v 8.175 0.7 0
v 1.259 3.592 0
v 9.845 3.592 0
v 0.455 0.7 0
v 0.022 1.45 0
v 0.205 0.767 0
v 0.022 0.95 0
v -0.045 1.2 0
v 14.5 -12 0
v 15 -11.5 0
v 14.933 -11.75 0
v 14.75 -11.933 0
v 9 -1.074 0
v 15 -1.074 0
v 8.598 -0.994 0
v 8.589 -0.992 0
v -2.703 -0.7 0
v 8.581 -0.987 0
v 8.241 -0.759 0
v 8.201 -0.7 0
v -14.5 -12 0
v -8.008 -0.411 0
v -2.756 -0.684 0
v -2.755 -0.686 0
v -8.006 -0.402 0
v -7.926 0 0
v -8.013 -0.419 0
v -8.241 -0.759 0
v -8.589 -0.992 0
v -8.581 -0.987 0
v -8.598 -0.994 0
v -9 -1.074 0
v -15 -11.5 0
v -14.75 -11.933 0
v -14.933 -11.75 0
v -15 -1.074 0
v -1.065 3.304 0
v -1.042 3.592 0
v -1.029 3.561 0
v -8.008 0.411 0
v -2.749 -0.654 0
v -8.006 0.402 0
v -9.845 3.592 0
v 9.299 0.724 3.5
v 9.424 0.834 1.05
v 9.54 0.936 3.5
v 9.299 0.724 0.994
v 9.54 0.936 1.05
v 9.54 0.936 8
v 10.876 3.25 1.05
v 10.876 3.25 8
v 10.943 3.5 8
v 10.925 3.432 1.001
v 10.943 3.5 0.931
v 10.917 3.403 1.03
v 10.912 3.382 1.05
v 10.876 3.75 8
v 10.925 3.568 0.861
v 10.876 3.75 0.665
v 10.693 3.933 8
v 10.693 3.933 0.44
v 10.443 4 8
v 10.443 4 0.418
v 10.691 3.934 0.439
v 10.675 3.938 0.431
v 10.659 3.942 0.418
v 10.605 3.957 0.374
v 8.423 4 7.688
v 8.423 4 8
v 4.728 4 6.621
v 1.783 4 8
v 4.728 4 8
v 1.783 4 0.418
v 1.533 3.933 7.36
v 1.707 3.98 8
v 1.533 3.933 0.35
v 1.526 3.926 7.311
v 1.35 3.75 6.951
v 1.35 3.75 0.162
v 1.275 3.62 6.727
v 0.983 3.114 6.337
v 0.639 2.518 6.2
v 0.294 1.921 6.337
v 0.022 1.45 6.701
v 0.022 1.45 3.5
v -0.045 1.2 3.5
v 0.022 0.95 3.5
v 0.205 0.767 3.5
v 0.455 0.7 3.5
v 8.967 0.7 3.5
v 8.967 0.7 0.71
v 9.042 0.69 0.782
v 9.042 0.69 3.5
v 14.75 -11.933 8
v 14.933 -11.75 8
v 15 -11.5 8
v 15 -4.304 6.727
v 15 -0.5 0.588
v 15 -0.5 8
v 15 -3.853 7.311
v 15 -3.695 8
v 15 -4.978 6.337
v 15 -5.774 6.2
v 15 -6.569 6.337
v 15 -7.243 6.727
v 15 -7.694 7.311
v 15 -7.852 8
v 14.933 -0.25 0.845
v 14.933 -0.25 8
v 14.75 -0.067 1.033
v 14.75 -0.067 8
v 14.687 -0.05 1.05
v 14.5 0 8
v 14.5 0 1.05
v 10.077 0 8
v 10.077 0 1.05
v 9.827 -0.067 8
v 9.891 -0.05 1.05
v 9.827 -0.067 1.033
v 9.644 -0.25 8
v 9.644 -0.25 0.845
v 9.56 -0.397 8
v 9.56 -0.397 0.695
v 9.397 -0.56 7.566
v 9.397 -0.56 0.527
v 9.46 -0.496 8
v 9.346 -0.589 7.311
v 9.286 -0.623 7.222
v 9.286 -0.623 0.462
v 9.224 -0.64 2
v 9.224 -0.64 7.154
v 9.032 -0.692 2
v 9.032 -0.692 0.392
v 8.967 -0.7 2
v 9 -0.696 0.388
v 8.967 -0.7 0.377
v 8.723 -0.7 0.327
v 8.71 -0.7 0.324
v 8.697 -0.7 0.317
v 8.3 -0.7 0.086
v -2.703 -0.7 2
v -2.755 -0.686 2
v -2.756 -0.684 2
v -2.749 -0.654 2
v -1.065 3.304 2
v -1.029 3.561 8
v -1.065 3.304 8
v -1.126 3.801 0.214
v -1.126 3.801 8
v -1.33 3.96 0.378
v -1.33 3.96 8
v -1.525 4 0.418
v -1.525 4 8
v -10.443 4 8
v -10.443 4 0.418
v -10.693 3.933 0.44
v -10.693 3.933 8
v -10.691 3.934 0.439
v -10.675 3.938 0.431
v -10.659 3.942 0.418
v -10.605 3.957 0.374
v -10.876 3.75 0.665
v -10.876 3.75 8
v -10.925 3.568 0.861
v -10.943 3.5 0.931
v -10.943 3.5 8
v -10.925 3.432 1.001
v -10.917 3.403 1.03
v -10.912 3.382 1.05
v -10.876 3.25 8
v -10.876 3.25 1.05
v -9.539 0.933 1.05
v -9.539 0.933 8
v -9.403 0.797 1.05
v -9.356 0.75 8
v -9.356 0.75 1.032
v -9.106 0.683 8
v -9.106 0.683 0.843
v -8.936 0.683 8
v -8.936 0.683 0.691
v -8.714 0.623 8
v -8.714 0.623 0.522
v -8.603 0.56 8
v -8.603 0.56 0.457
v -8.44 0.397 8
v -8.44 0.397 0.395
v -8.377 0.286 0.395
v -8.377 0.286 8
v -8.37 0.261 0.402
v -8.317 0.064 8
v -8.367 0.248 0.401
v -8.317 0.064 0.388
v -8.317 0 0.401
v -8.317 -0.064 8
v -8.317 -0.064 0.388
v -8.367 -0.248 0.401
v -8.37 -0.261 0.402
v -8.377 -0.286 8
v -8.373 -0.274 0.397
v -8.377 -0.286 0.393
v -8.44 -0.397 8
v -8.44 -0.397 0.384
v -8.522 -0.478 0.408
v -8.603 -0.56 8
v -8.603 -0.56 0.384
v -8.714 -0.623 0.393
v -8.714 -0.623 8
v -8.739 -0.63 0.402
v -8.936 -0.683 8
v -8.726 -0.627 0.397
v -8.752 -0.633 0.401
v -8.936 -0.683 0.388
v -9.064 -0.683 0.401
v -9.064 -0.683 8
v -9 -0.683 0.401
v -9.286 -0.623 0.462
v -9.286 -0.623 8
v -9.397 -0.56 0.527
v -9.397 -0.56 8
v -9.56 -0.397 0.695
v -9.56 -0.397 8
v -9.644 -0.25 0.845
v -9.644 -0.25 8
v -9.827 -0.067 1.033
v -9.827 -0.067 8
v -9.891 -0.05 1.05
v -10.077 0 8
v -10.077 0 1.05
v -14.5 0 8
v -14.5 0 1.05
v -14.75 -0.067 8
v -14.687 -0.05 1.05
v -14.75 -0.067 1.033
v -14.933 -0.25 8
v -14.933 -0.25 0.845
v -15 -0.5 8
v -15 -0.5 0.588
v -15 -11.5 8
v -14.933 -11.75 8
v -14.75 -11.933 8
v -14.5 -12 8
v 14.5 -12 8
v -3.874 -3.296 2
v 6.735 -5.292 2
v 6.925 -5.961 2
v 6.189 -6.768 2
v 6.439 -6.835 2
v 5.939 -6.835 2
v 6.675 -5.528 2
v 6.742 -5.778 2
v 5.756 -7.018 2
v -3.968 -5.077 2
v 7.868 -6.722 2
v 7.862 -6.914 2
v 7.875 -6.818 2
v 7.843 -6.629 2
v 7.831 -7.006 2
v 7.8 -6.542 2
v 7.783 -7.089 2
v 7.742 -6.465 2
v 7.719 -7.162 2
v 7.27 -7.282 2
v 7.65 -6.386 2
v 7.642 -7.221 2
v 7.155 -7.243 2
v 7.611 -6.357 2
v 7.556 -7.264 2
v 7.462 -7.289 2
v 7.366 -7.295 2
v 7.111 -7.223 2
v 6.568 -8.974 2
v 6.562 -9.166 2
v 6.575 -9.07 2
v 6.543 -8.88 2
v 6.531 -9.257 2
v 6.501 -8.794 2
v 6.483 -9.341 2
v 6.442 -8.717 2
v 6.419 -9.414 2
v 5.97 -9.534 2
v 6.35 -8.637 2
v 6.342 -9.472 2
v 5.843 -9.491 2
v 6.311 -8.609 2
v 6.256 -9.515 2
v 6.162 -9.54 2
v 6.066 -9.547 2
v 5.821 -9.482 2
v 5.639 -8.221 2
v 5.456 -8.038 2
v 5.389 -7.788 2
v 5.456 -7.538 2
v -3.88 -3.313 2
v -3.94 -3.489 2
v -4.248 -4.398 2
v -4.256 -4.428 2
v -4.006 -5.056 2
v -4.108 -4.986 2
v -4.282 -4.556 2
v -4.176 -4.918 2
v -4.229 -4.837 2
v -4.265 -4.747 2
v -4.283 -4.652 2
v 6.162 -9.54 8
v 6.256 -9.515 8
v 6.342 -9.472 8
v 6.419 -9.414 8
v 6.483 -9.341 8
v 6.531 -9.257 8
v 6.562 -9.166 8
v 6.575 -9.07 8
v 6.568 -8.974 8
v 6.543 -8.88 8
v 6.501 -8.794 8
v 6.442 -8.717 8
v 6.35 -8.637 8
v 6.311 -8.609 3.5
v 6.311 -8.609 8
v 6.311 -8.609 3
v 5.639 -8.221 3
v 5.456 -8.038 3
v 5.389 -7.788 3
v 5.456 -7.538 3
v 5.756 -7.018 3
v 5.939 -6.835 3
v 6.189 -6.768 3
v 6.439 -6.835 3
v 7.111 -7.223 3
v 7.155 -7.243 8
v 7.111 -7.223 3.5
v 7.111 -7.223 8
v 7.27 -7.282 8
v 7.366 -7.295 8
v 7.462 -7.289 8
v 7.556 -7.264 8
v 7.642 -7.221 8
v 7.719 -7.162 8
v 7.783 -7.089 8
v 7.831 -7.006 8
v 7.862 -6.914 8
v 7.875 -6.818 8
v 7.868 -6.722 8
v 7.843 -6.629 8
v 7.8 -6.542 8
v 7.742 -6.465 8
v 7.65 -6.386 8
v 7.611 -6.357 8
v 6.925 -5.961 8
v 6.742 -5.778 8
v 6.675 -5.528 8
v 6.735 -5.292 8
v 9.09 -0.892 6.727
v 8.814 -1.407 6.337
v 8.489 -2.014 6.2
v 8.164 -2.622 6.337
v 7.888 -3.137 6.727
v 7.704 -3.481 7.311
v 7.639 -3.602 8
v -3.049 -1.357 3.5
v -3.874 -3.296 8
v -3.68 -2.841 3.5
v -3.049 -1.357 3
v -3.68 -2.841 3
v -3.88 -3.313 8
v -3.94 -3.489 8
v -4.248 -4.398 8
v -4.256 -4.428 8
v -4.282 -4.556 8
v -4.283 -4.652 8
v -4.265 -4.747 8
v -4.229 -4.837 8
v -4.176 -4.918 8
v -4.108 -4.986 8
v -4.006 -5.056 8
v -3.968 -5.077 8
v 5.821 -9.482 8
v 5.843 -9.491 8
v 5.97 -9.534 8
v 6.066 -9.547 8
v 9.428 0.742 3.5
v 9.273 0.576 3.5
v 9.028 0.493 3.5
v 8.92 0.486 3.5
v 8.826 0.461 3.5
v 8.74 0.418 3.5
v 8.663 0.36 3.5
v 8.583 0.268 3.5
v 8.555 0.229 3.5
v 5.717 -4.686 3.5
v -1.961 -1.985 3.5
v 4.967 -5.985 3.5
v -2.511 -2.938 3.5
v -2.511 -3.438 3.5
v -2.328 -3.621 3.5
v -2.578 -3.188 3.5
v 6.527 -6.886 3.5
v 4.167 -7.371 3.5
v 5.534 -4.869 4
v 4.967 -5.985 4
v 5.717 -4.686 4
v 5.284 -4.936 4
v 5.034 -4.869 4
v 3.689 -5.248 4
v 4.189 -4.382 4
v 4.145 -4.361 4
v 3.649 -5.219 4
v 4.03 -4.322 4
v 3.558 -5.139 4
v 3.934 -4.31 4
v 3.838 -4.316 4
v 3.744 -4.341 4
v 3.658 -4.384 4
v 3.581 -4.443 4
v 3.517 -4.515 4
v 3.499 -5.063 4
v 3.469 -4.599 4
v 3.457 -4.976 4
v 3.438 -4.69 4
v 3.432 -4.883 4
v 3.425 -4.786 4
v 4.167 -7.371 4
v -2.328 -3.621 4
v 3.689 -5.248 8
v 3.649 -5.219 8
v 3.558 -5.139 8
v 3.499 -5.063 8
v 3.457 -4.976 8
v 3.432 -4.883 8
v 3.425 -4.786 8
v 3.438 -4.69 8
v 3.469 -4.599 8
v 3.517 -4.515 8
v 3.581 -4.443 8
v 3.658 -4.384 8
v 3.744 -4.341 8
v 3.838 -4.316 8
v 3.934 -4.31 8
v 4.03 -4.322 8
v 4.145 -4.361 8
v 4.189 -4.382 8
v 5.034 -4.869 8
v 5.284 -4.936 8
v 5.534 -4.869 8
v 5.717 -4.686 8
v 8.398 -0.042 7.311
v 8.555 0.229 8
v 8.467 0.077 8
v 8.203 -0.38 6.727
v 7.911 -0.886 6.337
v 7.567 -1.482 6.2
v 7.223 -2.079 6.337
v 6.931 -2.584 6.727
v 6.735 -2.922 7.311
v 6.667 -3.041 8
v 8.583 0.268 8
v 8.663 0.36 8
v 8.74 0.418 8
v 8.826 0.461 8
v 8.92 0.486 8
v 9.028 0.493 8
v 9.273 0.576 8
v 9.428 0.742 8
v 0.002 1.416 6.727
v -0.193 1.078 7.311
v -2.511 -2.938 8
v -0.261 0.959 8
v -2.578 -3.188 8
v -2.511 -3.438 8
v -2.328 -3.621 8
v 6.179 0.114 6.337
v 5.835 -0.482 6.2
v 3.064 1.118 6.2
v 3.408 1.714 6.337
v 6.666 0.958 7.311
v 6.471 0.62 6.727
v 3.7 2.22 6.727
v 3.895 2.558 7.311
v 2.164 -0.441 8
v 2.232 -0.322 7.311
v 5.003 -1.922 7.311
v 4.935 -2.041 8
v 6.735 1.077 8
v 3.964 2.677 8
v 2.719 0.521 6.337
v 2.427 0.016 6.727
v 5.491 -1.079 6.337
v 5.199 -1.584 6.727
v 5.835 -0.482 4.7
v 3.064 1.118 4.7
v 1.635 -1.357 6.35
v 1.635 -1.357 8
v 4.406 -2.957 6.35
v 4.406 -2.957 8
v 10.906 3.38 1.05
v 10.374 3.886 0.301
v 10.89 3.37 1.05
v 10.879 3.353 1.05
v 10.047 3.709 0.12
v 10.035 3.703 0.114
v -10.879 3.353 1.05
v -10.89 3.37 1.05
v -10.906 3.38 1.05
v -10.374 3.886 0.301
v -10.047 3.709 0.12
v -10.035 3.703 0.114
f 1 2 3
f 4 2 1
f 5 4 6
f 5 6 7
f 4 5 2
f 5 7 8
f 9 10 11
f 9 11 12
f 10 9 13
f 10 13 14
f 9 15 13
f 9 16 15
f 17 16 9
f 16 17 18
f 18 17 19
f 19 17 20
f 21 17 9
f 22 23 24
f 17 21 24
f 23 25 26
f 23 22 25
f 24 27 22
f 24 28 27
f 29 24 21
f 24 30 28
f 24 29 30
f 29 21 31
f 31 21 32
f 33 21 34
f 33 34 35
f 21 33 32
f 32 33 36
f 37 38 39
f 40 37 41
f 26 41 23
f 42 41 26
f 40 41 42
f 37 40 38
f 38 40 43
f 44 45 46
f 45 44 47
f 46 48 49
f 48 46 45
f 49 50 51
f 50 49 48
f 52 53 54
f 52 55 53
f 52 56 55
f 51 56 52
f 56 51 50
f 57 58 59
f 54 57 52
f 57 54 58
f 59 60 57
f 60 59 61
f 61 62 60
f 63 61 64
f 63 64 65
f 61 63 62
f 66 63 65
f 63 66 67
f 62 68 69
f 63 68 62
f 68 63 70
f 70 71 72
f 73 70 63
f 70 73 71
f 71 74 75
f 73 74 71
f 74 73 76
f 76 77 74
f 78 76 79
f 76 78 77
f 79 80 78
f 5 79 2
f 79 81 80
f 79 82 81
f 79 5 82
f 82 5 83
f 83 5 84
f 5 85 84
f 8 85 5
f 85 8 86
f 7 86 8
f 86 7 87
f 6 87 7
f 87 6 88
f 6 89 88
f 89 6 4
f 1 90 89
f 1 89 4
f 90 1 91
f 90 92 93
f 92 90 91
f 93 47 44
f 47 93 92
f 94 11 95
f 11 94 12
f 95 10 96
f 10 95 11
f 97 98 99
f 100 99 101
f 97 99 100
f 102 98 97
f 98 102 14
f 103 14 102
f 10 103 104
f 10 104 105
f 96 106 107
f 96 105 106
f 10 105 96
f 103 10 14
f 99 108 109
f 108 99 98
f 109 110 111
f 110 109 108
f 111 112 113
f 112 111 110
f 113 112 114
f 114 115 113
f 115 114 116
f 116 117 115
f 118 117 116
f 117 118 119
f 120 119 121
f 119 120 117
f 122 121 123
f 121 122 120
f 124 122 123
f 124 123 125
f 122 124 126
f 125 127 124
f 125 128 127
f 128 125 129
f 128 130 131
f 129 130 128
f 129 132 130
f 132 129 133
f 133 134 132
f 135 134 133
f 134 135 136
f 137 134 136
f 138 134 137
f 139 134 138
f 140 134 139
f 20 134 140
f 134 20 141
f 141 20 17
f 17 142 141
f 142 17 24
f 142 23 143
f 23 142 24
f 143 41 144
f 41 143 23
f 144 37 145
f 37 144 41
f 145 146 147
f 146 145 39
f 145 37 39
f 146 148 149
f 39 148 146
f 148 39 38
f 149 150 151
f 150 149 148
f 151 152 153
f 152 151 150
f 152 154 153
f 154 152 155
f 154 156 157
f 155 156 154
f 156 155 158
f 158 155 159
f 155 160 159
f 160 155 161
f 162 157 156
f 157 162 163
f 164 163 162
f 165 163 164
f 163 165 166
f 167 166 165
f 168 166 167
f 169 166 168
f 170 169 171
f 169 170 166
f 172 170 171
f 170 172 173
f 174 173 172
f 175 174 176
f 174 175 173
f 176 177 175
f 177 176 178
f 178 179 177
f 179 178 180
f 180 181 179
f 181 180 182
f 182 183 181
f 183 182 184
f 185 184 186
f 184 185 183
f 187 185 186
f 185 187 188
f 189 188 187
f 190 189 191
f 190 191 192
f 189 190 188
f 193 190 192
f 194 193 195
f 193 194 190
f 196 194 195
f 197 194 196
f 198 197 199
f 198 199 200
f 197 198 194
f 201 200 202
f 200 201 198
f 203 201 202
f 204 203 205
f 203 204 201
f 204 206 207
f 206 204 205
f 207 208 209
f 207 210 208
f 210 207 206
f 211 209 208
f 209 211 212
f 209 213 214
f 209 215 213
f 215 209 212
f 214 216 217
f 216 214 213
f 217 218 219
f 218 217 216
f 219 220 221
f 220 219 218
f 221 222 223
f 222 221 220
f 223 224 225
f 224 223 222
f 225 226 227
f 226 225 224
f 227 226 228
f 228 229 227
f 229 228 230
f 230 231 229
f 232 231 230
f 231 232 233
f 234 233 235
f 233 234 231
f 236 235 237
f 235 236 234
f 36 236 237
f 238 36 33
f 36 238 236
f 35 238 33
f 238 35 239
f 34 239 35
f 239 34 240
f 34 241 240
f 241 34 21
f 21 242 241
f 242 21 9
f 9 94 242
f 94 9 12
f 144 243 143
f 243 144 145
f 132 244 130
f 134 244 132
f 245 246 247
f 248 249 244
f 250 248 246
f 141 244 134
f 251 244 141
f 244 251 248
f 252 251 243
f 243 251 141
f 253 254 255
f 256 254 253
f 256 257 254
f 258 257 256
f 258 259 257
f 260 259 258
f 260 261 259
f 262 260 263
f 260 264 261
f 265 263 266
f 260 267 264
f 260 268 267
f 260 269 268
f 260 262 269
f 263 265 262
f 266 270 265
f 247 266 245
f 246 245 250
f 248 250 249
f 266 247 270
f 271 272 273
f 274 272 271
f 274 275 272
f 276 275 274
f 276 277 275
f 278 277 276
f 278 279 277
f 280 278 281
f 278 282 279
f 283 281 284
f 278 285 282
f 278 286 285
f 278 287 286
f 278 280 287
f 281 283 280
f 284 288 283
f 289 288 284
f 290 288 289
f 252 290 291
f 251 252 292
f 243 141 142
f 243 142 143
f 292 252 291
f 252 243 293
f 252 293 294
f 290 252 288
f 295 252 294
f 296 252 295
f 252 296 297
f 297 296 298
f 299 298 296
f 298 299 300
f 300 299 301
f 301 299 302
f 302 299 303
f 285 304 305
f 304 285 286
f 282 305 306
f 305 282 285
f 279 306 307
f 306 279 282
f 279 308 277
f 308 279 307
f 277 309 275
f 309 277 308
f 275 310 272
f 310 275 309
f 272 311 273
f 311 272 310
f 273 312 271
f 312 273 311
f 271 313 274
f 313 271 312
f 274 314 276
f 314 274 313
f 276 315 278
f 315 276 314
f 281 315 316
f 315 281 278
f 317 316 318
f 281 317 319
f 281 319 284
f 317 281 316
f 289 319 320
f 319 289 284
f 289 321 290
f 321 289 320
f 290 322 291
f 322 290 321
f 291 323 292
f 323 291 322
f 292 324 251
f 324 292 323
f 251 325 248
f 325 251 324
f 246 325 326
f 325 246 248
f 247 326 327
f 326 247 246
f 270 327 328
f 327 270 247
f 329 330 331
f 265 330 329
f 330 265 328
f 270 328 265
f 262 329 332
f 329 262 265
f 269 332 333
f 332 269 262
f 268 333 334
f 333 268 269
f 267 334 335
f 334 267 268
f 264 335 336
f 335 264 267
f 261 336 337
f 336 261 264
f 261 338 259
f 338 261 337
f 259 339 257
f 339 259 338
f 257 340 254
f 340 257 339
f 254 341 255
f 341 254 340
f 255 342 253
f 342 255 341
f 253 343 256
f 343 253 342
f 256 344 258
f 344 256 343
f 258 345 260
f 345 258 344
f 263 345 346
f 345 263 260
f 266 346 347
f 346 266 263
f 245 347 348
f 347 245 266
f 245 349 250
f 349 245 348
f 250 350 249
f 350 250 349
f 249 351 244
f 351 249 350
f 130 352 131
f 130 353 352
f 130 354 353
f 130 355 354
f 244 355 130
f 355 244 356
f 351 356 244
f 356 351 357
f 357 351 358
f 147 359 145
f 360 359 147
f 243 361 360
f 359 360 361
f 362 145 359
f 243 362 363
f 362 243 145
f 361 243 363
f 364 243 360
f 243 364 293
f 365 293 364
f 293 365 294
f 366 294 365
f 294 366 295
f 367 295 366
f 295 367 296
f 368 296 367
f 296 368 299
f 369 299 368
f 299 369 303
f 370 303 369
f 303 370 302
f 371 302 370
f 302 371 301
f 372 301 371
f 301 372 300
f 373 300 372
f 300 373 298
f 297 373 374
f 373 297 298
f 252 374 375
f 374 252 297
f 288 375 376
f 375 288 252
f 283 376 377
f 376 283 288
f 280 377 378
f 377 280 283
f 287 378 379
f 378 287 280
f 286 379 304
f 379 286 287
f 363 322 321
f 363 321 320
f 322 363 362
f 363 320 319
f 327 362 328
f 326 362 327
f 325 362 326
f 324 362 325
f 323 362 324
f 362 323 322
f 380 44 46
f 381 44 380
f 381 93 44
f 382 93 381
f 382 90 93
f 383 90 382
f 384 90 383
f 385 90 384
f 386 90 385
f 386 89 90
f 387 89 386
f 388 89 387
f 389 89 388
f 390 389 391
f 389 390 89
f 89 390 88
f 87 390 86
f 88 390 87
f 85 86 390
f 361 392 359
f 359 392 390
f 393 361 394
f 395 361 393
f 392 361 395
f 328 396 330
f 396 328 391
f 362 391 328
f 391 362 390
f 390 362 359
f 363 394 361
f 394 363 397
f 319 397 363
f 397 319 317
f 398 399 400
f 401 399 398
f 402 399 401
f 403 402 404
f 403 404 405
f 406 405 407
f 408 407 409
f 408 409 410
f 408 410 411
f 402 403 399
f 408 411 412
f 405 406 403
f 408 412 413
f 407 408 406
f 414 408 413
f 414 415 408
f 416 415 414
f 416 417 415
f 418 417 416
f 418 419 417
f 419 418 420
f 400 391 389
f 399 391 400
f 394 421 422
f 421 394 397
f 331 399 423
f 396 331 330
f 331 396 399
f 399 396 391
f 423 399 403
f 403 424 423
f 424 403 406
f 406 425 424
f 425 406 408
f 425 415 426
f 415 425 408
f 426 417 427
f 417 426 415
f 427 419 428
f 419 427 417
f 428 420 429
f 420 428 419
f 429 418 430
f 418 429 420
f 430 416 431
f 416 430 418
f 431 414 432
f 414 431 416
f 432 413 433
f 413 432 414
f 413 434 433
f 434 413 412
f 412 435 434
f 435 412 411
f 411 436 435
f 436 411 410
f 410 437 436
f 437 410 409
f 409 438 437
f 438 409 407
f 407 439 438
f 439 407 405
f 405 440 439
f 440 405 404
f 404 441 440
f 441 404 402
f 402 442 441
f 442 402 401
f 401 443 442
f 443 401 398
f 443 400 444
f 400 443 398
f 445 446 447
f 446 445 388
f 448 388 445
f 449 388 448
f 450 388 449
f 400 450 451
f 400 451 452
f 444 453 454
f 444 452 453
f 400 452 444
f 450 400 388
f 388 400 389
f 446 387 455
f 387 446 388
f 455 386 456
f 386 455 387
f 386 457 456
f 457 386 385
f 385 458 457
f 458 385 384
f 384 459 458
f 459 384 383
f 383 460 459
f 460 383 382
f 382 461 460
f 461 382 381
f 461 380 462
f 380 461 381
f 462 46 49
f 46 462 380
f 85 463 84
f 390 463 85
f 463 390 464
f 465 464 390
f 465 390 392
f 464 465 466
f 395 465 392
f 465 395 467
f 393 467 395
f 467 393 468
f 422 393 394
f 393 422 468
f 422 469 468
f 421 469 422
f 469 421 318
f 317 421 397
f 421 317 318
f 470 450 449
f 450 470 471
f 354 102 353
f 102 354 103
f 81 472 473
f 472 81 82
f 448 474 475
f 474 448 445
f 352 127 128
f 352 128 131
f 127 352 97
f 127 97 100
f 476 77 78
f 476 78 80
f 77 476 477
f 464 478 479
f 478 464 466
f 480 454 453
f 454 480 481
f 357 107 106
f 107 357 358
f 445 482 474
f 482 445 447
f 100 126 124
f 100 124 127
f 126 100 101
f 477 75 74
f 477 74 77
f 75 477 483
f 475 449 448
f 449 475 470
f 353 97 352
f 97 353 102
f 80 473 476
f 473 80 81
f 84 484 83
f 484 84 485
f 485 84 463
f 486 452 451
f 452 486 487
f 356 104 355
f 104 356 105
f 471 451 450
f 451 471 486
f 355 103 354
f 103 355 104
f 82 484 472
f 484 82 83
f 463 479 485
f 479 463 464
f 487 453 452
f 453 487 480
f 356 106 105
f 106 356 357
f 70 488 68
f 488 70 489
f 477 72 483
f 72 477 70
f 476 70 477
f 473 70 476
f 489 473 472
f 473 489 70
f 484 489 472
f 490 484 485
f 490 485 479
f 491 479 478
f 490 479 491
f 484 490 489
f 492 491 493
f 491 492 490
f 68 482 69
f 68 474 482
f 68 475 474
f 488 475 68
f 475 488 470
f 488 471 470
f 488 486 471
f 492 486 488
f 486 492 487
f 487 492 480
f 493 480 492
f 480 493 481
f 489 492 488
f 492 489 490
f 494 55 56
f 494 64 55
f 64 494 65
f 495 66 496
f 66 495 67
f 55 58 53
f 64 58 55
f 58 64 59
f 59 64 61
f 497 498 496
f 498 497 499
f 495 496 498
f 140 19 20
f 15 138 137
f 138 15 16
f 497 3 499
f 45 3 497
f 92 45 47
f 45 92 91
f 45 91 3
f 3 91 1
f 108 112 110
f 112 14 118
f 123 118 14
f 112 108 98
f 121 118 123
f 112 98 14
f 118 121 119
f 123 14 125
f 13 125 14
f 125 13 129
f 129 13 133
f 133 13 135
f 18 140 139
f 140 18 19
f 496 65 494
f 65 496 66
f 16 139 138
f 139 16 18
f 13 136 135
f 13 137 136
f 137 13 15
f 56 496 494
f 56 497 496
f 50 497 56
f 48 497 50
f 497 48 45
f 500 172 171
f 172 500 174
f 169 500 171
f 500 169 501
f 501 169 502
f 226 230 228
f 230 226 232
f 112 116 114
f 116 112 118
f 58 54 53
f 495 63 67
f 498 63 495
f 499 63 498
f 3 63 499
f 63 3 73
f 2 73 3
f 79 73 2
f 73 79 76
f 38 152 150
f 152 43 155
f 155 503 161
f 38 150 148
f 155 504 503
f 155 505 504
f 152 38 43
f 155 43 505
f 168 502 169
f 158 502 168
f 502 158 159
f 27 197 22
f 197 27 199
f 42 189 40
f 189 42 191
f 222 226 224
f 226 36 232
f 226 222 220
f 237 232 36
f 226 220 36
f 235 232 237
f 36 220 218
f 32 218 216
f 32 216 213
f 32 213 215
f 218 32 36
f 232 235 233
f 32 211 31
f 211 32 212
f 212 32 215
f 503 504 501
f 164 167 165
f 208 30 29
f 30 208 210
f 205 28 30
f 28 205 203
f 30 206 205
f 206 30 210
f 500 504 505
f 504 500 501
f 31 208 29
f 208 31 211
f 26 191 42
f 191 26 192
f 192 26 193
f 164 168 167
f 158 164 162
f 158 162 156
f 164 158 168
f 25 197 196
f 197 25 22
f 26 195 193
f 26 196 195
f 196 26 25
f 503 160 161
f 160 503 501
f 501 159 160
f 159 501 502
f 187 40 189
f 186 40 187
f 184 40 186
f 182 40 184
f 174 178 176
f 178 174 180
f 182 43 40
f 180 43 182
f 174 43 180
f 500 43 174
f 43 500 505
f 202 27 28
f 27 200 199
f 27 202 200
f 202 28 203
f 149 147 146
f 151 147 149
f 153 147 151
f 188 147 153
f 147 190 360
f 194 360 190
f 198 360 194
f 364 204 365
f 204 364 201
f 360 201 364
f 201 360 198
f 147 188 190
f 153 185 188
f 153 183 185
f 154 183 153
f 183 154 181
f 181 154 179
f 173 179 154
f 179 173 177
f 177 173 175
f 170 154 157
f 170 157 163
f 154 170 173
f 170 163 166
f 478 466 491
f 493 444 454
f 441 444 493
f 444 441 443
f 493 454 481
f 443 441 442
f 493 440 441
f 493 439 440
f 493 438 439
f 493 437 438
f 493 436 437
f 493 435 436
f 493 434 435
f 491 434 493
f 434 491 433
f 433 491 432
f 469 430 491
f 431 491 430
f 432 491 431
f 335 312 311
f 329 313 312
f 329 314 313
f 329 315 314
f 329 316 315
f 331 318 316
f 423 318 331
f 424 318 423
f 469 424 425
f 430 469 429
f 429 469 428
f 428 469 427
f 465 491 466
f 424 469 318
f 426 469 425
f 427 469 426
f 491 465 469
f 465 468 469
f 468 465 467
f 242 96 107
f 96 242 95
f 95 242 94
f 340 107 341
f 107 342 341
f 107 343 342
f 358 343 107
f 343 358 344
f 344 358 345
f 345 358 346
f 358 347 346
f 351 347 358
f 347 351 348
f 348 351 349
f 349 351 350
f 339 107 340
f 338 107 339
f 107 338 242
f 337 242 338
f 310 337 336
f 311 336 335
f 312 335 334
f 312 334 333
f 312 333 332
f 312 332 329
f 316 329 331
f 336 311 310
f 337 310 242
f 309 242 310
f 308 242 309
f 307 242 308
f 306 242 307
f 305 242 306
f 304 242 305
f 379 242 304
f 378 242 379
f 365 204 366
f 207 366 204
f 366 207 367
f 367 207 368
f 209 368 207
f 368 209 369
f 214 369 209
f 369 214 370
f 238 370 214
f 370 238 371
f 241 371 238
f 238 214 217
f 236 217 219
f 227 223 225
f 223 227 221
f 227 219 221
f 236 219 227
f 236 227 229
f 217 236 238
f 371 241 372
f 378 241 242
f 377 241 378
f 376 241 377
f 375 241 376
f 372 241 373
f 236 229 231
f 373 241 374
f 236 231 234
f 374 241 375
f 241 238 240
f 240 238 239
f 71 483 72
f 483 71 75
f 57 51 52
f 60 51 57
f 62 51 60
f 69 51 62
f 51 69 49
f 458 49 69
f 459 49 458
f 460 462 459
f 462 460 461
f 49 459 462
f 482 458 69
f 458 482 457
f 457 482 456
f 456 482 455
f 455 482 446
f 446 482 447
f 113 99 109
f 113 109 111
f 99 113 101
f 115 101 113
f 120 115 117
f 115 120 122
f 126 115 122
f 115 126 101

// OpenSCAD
// file: libdict.scad
// This library add dictionary like features to openscad
// the dictionary is a list of pairs as we cannot define new types.
// Unlike a python dictionary we cannot do a proper hash table for speed
// so everything is build around the OpenSCAD search function
// There are a lot of assert statements to ensure data in the "dictionary"
// is in the format of
// * A list of lists
// * Each internal list has a length of two
// * First element of each internal list is a string (the key)
// * All keys are unique.


// Private function:
// This function returns true if the value is in the list
// value must be a string.
// No error checking, for use by is_in only!
function _is_in_str(value, list) = 
    search([value], list) != [[]];

// Private function:
// This function returns true if the value is in the list
// value must be a number.
// No error checking, for use by is_in only!
function _is_in_num(value, list) = 
    search(value, list) != [];


// This function returns true if the value is in the list
// value must be a string or a number.
function is_in(value, list) = 
    assert(is_num(value) || is_string(value) , "is_in: value must be a number or string")
    assert(is_list(list), "is_in: list must be a list")
    is_num(value) ? _is_in_num(value, list) : _is_in_str(value, list);

// An errant match is when a non-list matches with the first element in a list
// a list match a non list though. Cannot know which element is the non-list
// but we do know that it is errant if exactly one of them is not a list
function _check_errant_match(list, match) = let(
    non_list = [for (m = match) is_list(list[m])? 0 : 1],
    // note when recording count_nl (counting non lists) it is first recorded before anything is iterated.
    // the second recording happens after i is iterated to 0, then count_nl counts whether non_list[0] is 1
    count = [for (i=-1, count_nl=0; i<len(match);i=i+1,count_nl=count_nl+non_list[i]) count_nl]
    // the last element (count[len(match)] is equal to 1 on an errant match)
) count[len(match)] == 1 ? 0 : 1;

// Returns true if all emements in list are unique.
function is_unique(list) = 
    assert(is_list(list), "is_unique: list must be a list")
    let(
        matches = search(list, list, 0),
        // Assign 1 or 0 depending on is the match length for each element
        // return wether any matches are greater than one (mathcing more than
        // itself)
        // note cannot search for true or false so using 1 and zero
        bool_list = [for (match = matches) if (len(match)==1) 0 
            // should put a 1 here to show they matched but in the case of
            // [1, [1]] it will match both, so need to check if they are
            // both lists or both not list
            else _check_errant_match(list, match)]
    ) !is_in(1, bool_list);

// Private function:
// Checks that the input is a list and that every element is a list
// of length 2.
// No error checking, for use by valid_dict only!
function _is_pairs(list) =
    !is_list(list) ? false :
        len(list)==0 ? false :
            !is_in(0, [for (pair = list) is_list(pair) && len(pair)==2 ? 1: 0]);

// Private function:
// Checks all elements in the list are strings
// No error checking, for use by valid_dict only!
// Strings can't be empty
function _is_list_of_strings(list) =
    !is_in(0, [for (item = list) is_string(item) && len(item)>0 ? 1: 0]);

// Private function:
// Returns the keus in a dictionary
// No error checking, for use by valid_dict only!
function _keylist(dict)  = [for (pair=dict) pair[0]];
 
function valid_dict(dict) =
    //if the input are not pairs return instantly
    !_is_pairs(dict) ? false : let (
        //if they are pairs get all keys
        keys = _keylist(dict),
        all_strings =  _is_list_of_strings(keys),
        unique = is_unique(keys)
    ) (all_strings && unique) ? true : false;

// Key lookup for key value pair "dictionary".
// Unlike the built in lookup this works with strings.
function key_lookup(key, dict) = 
    assert(is_string(key), "`key` must be a string")
    assert(valid_dict(dict), "`dict` must be a valid 'dictionary'")
    let(
        // key is in [] because otherwise openscad will search for each letter rather than the string.
        index = search([key], dict, 1, 0)[0]
    )  assert (index!=[], "Key lookup failed, key not found!") dict[index][1];

// Creates a new dictionary with a key value pair replaced. Pair must already
// be in dictionary.
function replace_value(key, value, dict) = 
    assert(is_string(key), "`key` must be a string")
    assert(valid_dict(dict), "`dict` must be a valid 'dictionary'")
    assert(is_in(key, _keylist(dict)), "`key` not found in dictionary!")
    [for (kv_pair = dict) key!=kv_pair[0] ? kv_pair : [key, value]];


// Creates a new dictionary with a a set of key value pair replaced
// both inputs must be a dictionary. All keys in input must already be
// in dictionary
function replace_multiple_values(rep_dict, dict) =
    assert(valid_dict(rep_dict), "`rep dict` must be a valid 'dictionary'")
    assert(valid_dict(dict), "`dict` must be a valid 'dictionary'")
    let(
        // loop over all keys in replacement dict checking they are in the original
        rep_keys = [for (key = _keylist(rep_dict))
            assert(is_in(key, _keylist(dict)), "`key` not found in dictionary!")
            key
        ]
    ) //Finally return the updated dictionary using this long list comprehension.
    [
        for (kv_pair = dict) let(
            key = kv_pair[0],
            // check if this key is in the replacement dictionary and if so return index
            // key is in [] because otherwise openscad will search for each letter rather
            // than the string.
            index = search([key], rep_dict, 1, 0)[0]
            // if index is empty return original key value pair, else return the key with
            // the replaced value
        ) index == [] ? kv_pair : [key, rep_dict[index][1]]
    ];
// main file
/*

Some sketches to work towards a nicer dovetail mechanism in OpenSCAD.

(c) Richard Bowman 2021, released under CERN-OHL-W v2

*/

/*
Conversion notes:

I swapped from lookup functions to regular dicts with a regex
p\("([a-z_]+)"\)
replace with
key_lookup("$1", p)

 functions renamed to old names
ofu_ -> ""
*/

use <./libdict.scad>;
use <utilities.scad>;

function dovetail_default_params() = [
    ["depth", 4],            // y distance between outer flat surface and tip
    ["angle", 60],           // angle of sloping part
    ["outer_flat", 6],       // width of outer flat parts
    ["overall_width", 30],   // width of whole structure
    ["overall_height", 16],  // height of whole structure
    ["block_depth", 12],     // y size of mounting block
    ["fillet_r", 0.5],       // fillet radius for rounded corners
    ["relief_r", 0.7],       // fillet radius for rounded corners
    ["lever", 8],            // distance from flat surface to pivot of clamp
    ["flex_l", 4],           // length of clamp flexure
    ["flex_t", 1.6],         // thickness of above
    ["clamp_t", 9],          // thickness of clamping flange, in the direction of the bolt
    ["top_t", 2],            // thickness of the top solid layer
    ["bottom_t", 2],         // thickness of the bottom solid layer
    ["vertical_gap", 1],     // gap between clamp and top/bottom layers
    ["clamp_support_t", 0.5],// thickness of internal bridge support for clamp
    ["clamp_angle", 7],      // angle through which we allow the clamp to bend
    ["pinch_bolt_inset", 2], // distance from centre of clamping bolt to female point
    ["taper_block", false],  // set this to true to taper the block parallel to the flanges
];

function dovetail_params(
    // This is an experiment in how to handle the commonly-changed parameters more nicely
    height=16,
    width=30,
    block_depth=12,
    taper_block=false
) = replace_multiple_values(
    [
        ["overall_height", height],
        ["overall_width", width],
        ["block_depth", block_depth],
        ["taper_block", taper_block],
    ],
    dovetail_default_params()
);

module block_sharp(p){
    // the block to which we attach the male dovetail 
    // or from which we cut the female one

    w = key_lookup("overall_width", p);
    depth = key_lookup("block_depth", p);
    angle = key_lookup("angle", p);
    back_w = key_lookup("taper_block", p) ? w - 2*tan(90-angle)*depth : w;

    polygon([
        [     -w/2,      0],
        [      w/2,      0],
        [ back_w/2, -depth],
        [-back_w/2, -depth],
    ]);
}
module back_of_block_2d(p){
    // the back of the block to which we attach the male dovetail
    // or from which we cut the female one

    depth = key_lookup("block_depth", p);
    w = key_lookup("overall_width", p);
    angle = key_lookup("angle", p);
    back_w = key_lookup("taper_block", p) ? w - 2*tan(90-angle)*depth : w;
    fillet_r = key_lookup("fillet_r", p);

    hull() reflect([1,0,0]){
        translate([back_w/2 - fillet_r*tan(angle/2), -depth + fillet_r]) circle(r=fillet_r);
    }
}

module flange_r(p, width=tiny()){
    // the angled part of a male dovetail

    w = key_lookup("overall_width", p);
    flat = key_lookup("outer_flat", p);
    shiftx = [-width, 0];
    // we extend the parallelogram into the block slightly, 
    // at the same angle.
    shift_in = tiny()*[-cos(key_lookup("angle", p)), -sin(key_lookup("angle", p))];

    polygon([
        female_point(p) + shift_in,
        male_point(p),
        male_point(p) + shiftx,
        female_point(p) + shiftx + shift_in
    ]);
}

function male_point(p) = let(
    w = key_lookup("overall_width", p),
    flat = key_lookup("outer_flat", p),
    depth = key_lookup("depth", p),
    angle = key_lookup("angle", p)
) [w/2 - flat + depth/tan(angle), depth];

function female_point(p) = let(
    w = key_lookup("overall_width", p),
    flat = key_lookup("outer_flat", p),
    depth = key_lookup("depth", p),
    angle = key_lookup("angle", p)
) [w/2 - flat, 0];

module dovetail_section_m_sharp(p){
    // A male dovetail, before any filleting of the corners
    difference(){
        union(){
            block_sharp(p);

            hull() reflect([1, 0]) flange_r(p);
        }

        // relieve internal corners
        reflect([1, 0]) translate(female_point(p)){
            circle(key_lookup("relief_r", p));
        }        
    }
}

module dovetail_section_f_sharp_cutout(p){
    // We cut this shape out of a block to make the female cutout

    // The male dovetail
    hull() reflect([1, 0]) mirror([0,1]) flange_r(p);

    // relieve internal corners
    hull() reflect([1, 0]) translate(-male_point(p)){
        circle(key_lookup("relief_r", p));
    }
}

module dovetail_section_f_sharp(p){
    // A female dovetail, before any filleting of the corners
    difference(){
        block_sharp(p);
        
        dovetail_section_f_sharp_cutout(p);
    }
}

module rotate_repeat(angle){
    union(){
        children();
        rotate(angle) children();
    }
}

module clamp_frame(p){
    // place the origin at the pivot point of the clamp
    // and align y axis with the dovetail angle
    translate(female_point(p)) rotate(key_lookup("angle", p) - 90){
        translate([0, -key_lookup("lever", p)]) children();
    }
}

module clamp_cutout_2d(p){
    // 2D cutout to make a male dovetail clamp
    fillet_r = key_lookup("fillet_r", p);
    fp = female_point(p);
    mp = male_point(p);
    lever = key_lookup("lever", p);
    flex_l = key_lookup("flex_l", p);
    flex_t = key_lookup("flex_t", p);
    clamp_t = key_lookup("clamp_t", p);
    relief_r = key_lookup("relief_r", p);
    clamp_angle = key_lookup("clamp_angle", p);
    $fn=16;
    clamp_frame(p){
        // between nut and screw
        hull(){
            translate([0, fillet_r + flex_t/2]) circle(fillet_r);
            translate([0, lever]) circle(fillet_r); 
        } 
        // next to flexure
        hull() reflect([1,0]){
            translate([flex_l/2, fillet_r + flex_t/2]) circle(fillet_r);
        }
        // behind clamp
        sequential_hull(){
            // start next to the flexure
            translate([flex_l/2, -fillet_r - flex_t/2]) circle(fillet_r);
            // duplicate the corner point to allow it to bend
            rotate_repeat(clamp_angle) translate([-clamp_t, -fillet_r - flex_t/2]){
                circle(fillet_r);
            }
            // don't use the second corner point, to avoid shortening the clamping part
            // because of cosine error
            translate([-clamp_t, -fillet_r - flex_t/2]){
                circle(fillet_r);
            }
            // a far-away, wider point, so the opening is wedge-shaped.
            rotate_repeat(clamp_angle) translate([-clamp_t, 99]) circle(fillet_r);
        } 
    }
}
module clamp_cutout_empty_2d(p){
    // 2D cutout to make a male dovetail clamp
    union(){
        clamp_cutout_2d(p);

        // take the hull of just the internal part
        hull() intersection(){
            clamp_cutout_2d(p);
            hull() repeat([-99, 0], 2, center=false){
                clamp_frame(p) reflect([0, 1]) {
                    translate([0, key_lookup("lever", p)]) circle(key_lookup("relief_r", p));
                }
            }
        }
    }
}
module clamp_cutout_base_2d(p){
    // 2D cutout to separate the point of the clamp from the base
    fillet_r = key_lookup("fillet_r", p);
    relief_r = key_lookup("relief_r", p);
    lever = key_lookup("lever", p);
    
    union(){
        // separate the flange from the block
        hull() translate(female_point(p)){
            circle(relief_r);
            translate([-key_lookup("clamp_t", p)/sin(key_lookup("angle", p)), 0]) circle(relief_r);
        }

        // take the hull of just the external part
        intersection(){
            clamp_cutout_2d(p);
            hull() reflect([1, 0]) translate(female_point(p)){
                circle(key_lookup("relief_r", p));
                translate([0, 99]) circle(key_lookup("relief_r", p));
            }
        }
    }
}
module clamp_back_2d(p, extra_left=0, extra_right=0, extra_top=0){
    // back of the internal part of the clamp
    // extra_l and extra_r add additional length on
    // the left/right respectively.  By default (0), 
    // the part matches the size of the external part
    // of the clamp (i.e. it's in line with female_point)
    length = (
        key_lookup("clamp_t", p) -
        key_lookup("fillet_r", p) +
        extra_left + 
        extra_right
    );
    clamp_frame(p){
        translate([-length + extra_right, -key_lookup("flex_t", p)/2]){
            square([length, key_lookup("flex_t", p) + extra_top]);
        }
    }
}

module clamping_flange_2d(p){
    // 2D shape of the part of the flange that moves
    convex_fillet(p) difference(){
        union(){
            hull(){
                // external end
                flange_r(
                    p, 
                    width=( // NB this is defined in x, not in the clamp_frame.
                        (key_lookup("clamp_t", p) - key_lookup("fillet_r", p))
                        /sin(key_lookup("angle", p))
                    )
                );
                // internal end
                clamp_back_2d(p); // NB this gets cut by clamp_cutout_2d
            }

            // add the flexure to join to the block. 
            clamp_back_2d(
                p, 
                extra_right=key_lookup("flex_l", p)/2 + key_lookup("fillet_r", p),
                extra_left=-key_lookup("fillet_r", p) // avoid fouling the fillet
            );
        }

        clamp_cutout_2d(p);
    }
}

module clamping_flange(p){
    // The moving part that makes the right hand flange
    // clamp the female dovetail
    gap = key_lookup("vertical_gap", p);
    bottom = key_lookup("bottom_t", p) + gap + key_lookup("clamp_support_t", p);
    top = key_lookup("overall_height", p) - gap - key_lookup("top_t", p);
    translate([0,0,bottom]) linear_extrude(top - bottom){
        clamping_flange_2d(p);
    }
}

module clamping_bolt_and_nut(p){
    // The counterbored screw and nut that clamp the dovetail
    h = key_lookup("overall_height", p);
    clamp_y = ( // Place the clamping bolt relative to the female point
        key_lookup("lever", p) - key_lookup("pinch_bolt_inset", p)
    );
    fillet_r = key_lookup("fillet_r", p);
    // We place everything relative to 
    clamp_frame(p) translate([0, clamp_y, h/2]){
        $fn = 16;
        // Counterbored hole for screw (in solid block)
        rotate([0, 90, 0]){
            cylinder(d=3*1.2, h=99);
        }
        // Nut trap, with angled entry (in the clamp)
        rotate([0, -90, 0]){
            cylinder(d=3*1.2, h=key_lookup("clamp_t", p)); //shaft of the screw
            translate([0,0, fillet_r + 2]) rotate([0,0,60]) sequential_hull(){
                // TODO: replace this with a proper parametric nut trap!
                cylinder(r=3*1.1, h=3.2, $fn=6);
                translate([99,0,0]) cylinder(r=3*1.1, h=3.2, $fn=6);
            }
        }
    }
}

module clamp_support(p){
    // a bridge to support the internal part of the clamp
    gap = key_lookup("vertical_gap", p);
    bottom = key_lookup("bottom_t", p) + gap;
    support_t = key_lookup("clamp_support_t", p);
    fillet_r = key_lookup("fillet_r", p);

    // bridge the bottom of the flexure right across the gap
    translate([0,0,bottom]) linear_extrude(support_t){
        // a bridge to support the internal part of the clamp
        // this sits underneath the back of the clamp
        clamp_back_2d(
            p, 
            extra_left=3*key_lookup("fillet_r", p), 
            extra_right=key_lookup("flex_l", p)/2 + tiny()
        );
    }

    // bridge the bottom layer of the cut-out next to the flexure
    translate([0,0,bottom + support_t]) linear_extrude(support_t){
        // a bridge to support the internal part of the clamp
        // this sits underneath the back of the clamp
        clamp_back_2d(
            p, 
            extra_left=-fillet_r, 
            extra_right=-fillet_r,
            extra_top=3*fillet_r
        );
    }
}

module convex_fillet(p){
    // smooth the convex corners
    $fn=12;

    offset(key_lookup("fillet_r", p)) offset(-key_lookup("fillet_r", p)){
        children();
    }
}
module concave_fillet(p){
    // smooth the concave corners
    $fn=12;

    offset(-key_lookup("fillet_r", p)) offset(key_lookup("fillet_r", p)){
        children();
    }
}

module dovetail_section_m(p, relief=true){
    convex_fillet(p){
        dovetail_section_m_sharp(p, relief=relief);
    }
}

module undercut_male_dovetail(p){
    // Chamfer the bottom of the mating faces to avoid
    // wonkiness due to "elephant's foot" issues
    minkowski(){
        mirror([0,1,0]) linear_extrude(tiny()){
            dovetail_section_f_sharp(p);
        }

        cylinder(r1=2, r2=tiny(), h=2, $fn=16, center=true);
    }
}
module dovetail_clamp_m(p){
    // male dovetail with clamping arm
    h = key_lookup("overall_height", p);
    difference(){
        union(){
            difference(){
                linear_extrude(h) convex_fillet(p) difference(){
                    dovetail_section_m_sharp(p);

                    clamp_cutout_base_2d(p);
                }

                // void for clamp
                translate([0,0,2]) linear_extrude(h-4){
                    concave_fillet(p) clamp_cutout_empty_2d(p);
                }
            }

            // clamping flange
            clamping_flange(p);
            clamp_support(p);
        }

        clamping_bolt_and_nut(p);
        
        // work around "elephant's foot"/brim on mating faces
        undercut_male_dovetail(p);
    }
}



module dovetail_f(p, height=undef){
    // A female dovetail, existing in y<0 with mating face at y=0
    h = is_undef(height) ? key_lookup("overall_height", p) : height;
    linear_extrude(h) convex_fillet(p){
        dovetail_section_f_sharp(p);
    }
}
module dovetail_f_cutout(p, height=undef){
    // Cut this shape out of a block with a face at y=0 to make
    // a dovetail
    h = is_undef(height) ? key_lookup("overall_height", p) : height;
    w = key_lookup("overall_width", p);
    linear_extrude(h) concave_fillet(p) union(){
        dovetail_section_f_sharp_cutout(p);
        translate([-w/2, tiny()]) square([w, 99]);
    }
}

module dovetail_block(p, height=undef){
    // A 3D block, filleted as the dovetail would be
    h = is_undef(height) ? key_lookup("overall_height", p) : height;
    linear_extrude(h) convex_fillet(p){
        block_sharp(p);
    }
}

difference(){
    render(6) dovetail_clamp_m(dovetail_default_params());

    translate([0,0,key_lookup("overall_height", dovetail_default_params())/2]) cylinder(r=99, h=99, $fn=5);
}

%mirror([0,1,0]) dovetail_f(dovetail_default_params());
